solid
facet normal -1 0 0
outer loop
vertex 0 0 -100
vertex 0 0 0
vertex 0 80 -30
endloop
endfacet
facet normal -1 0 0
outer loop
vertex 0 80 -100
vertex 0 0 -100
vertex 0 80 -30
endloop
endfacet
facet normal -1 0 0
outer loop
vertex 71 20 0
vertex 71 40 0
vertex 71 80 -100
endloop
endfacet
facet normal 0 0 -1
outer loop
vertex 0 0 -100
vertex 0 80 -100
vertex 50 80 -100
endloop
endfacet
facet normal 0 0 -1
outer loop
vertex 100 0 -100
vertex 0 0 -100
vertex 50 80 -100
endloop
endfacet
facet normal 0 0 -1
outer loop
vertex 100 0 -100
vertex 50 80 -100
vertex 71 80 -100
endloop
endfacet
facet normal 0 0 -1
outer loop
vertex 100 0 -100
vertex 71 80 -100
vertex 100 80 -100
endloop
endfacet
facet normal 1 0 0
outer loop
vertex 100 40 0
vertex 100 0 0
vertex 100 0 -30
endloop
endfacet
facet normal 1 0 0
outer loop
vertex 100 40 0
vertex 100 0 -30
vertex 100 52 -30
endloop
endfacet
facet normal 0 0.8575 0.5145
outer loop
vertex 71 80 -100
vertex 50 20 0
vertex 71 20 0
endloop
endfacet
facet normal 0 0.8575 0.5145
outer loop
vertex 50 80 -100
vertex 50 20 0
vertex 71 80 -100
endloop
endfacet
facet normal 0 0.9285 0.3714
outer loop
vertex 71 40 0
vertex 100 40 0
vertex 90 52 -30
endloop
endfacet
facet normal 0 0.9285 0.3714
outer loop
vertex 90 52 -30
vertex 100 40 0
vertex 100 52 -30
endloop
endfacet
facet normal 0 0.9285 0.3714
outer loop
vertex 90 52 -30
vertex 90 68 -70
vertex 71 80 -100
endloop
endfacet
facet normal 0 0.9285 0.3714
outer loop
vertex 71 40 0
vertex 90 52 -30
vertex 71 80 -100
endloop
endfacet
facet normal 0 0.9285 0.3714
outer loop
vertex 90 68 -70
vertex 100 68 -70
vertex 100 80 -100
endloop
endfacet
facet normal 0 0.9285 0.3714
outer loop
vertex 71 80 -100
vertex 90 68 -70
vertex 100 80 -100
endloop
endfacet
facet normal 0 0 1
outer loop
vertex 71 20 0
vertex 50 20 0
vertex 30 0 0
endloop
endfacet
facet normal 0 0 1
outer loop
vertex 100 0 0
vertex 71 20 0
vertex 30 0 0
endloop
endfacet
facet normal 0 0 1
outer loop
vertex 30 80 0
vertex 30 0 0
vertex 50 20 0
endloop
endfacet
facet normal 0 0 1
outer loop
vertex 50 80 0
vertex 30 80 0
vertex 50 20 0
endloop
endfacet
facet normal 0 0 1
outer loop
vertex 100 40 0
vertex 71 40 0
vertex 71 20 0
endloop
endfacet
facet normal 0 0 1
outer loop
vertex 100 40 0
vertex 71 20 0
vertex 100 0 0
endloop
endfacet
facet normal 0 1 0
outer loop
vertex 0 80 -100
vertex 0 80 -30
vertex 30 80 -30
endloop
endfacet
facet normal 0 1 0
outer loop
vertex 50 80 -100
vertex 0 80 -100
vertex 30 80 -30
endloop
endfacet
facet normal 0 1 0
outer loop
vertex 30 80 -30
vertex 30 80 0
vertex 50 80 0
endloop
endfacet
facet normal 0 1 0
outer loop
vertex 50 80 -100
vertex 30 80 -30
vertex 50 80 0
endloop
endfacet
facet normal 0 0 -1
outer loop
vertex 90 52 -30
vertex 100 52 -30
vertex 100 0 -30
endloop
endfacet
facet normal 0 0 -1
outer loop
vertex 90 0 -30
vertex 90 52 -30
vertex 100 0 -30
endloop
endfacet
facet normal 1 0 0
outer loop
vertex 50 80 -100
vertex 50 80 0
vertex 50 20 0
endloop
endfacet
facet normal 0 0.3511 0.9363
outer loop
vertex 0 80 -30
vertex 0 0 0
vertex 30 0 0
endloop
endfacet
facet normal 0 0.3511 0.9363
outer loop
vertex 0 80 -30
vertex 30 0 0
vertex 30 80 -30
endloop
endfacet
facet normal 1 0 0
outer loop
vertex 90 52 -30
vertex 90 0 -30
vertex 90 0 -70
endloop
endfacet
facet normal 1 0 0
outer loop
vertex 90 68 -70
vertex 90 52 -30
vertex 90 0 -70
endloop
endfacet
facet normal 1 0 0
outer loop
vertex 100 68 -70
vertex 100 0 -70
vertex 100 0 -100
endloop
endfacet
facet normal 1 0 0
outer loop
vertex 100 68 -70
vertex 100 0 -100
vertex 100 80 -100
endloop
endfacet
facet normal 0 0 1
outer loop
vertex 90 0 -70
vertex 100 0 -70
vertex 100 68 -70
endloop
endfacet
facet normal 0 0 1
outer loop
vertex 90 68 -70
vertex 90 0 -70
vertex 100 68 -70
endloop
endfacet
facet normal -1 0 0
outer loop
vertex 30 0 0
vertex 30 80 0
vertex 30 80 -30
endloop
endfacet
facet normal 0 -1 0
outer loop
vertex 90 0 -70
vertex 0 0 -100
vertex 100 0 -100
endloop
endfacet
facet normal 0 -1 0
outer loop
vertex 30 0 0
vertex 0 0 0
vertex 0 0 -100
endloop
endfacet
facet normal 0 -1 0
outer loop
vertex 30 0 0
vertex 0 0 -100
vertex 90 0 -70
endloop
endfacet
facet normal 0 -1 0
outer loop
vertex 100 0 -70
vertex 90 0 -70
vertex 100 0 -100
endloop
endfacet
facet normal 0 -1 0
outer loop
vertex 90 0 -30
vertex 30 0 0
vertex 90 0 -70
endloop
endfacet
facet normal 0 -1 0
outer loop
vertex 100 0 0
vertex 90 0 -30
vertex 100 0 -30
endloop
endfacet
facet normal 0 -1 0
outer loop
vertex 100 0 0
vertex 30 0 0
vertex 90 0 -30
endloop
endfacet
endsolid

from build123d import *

# Parameters (mm, degrees)
SKETCH1_W               = 100
SKETCH1_H               = 80
BOSS_EXTRUDE1_DEPTH     = 100
CUT_EXTRUDE1_DEPTH      = 30
CUT_EXTRUDE2_DEPTH      = 50
CUT_EXTRUDE4_DEPTH      = 1
CUT_EXTRUDE4_DEPTH_BACK = 20
CUT_EXTRUDE4_START      = -30
CUT_EXTRUDE3_DEPTH      = 10


with BuildPart() as part:
    # Sketch1 → Boss-Extrude1 (new body)
    with BuildSketch(Plane.XY):
        with Locations((50, 40)):
            Rectangle(SKETCH1_W, SKETCH1_H)
    extrude(amount=-BOSS_EXTRUDE1_DEPTH)

    # Sketch3 → Cut-Extrude1 (cut)
    with BuildSketch(Plane.ZY):
        Polygon((0, 0), (-30, 80), (0, 80), align=None)
    extrude(amount=-CUT_EXTRUDE1_DEPTH, mode=Mode.SUBTRACT)

    # Sketch5 → Cut-Extrude2 (cut)
    with BuildSketch(Plane(origin=(100, 0, 0), x_dir=(0, 0, -1), z_dir=(1, 0, 0))):
        Polygon((0, 40), (100, 80), (0, 80), align=None)
    extrude(amount=-CUT_EXTRUDE2_DEPTH, mode=Mode.SUBTRACT)

    # Sketch8 → Cut-Extrude4 (cut, two sides: drawn at the far end of the back side and taken through both)
    with BuildSketch(Plane(origin=(100, 0, 0), x_dir=(0, 0, -1), z_dir=(1, 0, 0)).offset(CUT_EXTRUDE4_START - CUT_EXTRUDE4_DEPTH_BACK)):
        Polygon((0, 20), (100, 80), (0, 40), align=None)
    extrude(amount=CUT_EXTRUDE4_DEPTH + CUT_EXTRUDE4_DEPTH_BACK, mode=Mode.SUBTRACT)

    # Sketch7 → Cut-Extrude3 (cut)
    with BuildSketch(Plane(origin=(100, 0, 0), x_dir=(0, 0, -1), z_dir=(1, 0, 0))):
        Polygon((30, 52), (30, 0), (70, 0), (70, 68), align=None)
    extrude(amount=-CUT_EXTRUDE3_DEPTH, mode=Mode.SUBTRACT)


solid = part.part
